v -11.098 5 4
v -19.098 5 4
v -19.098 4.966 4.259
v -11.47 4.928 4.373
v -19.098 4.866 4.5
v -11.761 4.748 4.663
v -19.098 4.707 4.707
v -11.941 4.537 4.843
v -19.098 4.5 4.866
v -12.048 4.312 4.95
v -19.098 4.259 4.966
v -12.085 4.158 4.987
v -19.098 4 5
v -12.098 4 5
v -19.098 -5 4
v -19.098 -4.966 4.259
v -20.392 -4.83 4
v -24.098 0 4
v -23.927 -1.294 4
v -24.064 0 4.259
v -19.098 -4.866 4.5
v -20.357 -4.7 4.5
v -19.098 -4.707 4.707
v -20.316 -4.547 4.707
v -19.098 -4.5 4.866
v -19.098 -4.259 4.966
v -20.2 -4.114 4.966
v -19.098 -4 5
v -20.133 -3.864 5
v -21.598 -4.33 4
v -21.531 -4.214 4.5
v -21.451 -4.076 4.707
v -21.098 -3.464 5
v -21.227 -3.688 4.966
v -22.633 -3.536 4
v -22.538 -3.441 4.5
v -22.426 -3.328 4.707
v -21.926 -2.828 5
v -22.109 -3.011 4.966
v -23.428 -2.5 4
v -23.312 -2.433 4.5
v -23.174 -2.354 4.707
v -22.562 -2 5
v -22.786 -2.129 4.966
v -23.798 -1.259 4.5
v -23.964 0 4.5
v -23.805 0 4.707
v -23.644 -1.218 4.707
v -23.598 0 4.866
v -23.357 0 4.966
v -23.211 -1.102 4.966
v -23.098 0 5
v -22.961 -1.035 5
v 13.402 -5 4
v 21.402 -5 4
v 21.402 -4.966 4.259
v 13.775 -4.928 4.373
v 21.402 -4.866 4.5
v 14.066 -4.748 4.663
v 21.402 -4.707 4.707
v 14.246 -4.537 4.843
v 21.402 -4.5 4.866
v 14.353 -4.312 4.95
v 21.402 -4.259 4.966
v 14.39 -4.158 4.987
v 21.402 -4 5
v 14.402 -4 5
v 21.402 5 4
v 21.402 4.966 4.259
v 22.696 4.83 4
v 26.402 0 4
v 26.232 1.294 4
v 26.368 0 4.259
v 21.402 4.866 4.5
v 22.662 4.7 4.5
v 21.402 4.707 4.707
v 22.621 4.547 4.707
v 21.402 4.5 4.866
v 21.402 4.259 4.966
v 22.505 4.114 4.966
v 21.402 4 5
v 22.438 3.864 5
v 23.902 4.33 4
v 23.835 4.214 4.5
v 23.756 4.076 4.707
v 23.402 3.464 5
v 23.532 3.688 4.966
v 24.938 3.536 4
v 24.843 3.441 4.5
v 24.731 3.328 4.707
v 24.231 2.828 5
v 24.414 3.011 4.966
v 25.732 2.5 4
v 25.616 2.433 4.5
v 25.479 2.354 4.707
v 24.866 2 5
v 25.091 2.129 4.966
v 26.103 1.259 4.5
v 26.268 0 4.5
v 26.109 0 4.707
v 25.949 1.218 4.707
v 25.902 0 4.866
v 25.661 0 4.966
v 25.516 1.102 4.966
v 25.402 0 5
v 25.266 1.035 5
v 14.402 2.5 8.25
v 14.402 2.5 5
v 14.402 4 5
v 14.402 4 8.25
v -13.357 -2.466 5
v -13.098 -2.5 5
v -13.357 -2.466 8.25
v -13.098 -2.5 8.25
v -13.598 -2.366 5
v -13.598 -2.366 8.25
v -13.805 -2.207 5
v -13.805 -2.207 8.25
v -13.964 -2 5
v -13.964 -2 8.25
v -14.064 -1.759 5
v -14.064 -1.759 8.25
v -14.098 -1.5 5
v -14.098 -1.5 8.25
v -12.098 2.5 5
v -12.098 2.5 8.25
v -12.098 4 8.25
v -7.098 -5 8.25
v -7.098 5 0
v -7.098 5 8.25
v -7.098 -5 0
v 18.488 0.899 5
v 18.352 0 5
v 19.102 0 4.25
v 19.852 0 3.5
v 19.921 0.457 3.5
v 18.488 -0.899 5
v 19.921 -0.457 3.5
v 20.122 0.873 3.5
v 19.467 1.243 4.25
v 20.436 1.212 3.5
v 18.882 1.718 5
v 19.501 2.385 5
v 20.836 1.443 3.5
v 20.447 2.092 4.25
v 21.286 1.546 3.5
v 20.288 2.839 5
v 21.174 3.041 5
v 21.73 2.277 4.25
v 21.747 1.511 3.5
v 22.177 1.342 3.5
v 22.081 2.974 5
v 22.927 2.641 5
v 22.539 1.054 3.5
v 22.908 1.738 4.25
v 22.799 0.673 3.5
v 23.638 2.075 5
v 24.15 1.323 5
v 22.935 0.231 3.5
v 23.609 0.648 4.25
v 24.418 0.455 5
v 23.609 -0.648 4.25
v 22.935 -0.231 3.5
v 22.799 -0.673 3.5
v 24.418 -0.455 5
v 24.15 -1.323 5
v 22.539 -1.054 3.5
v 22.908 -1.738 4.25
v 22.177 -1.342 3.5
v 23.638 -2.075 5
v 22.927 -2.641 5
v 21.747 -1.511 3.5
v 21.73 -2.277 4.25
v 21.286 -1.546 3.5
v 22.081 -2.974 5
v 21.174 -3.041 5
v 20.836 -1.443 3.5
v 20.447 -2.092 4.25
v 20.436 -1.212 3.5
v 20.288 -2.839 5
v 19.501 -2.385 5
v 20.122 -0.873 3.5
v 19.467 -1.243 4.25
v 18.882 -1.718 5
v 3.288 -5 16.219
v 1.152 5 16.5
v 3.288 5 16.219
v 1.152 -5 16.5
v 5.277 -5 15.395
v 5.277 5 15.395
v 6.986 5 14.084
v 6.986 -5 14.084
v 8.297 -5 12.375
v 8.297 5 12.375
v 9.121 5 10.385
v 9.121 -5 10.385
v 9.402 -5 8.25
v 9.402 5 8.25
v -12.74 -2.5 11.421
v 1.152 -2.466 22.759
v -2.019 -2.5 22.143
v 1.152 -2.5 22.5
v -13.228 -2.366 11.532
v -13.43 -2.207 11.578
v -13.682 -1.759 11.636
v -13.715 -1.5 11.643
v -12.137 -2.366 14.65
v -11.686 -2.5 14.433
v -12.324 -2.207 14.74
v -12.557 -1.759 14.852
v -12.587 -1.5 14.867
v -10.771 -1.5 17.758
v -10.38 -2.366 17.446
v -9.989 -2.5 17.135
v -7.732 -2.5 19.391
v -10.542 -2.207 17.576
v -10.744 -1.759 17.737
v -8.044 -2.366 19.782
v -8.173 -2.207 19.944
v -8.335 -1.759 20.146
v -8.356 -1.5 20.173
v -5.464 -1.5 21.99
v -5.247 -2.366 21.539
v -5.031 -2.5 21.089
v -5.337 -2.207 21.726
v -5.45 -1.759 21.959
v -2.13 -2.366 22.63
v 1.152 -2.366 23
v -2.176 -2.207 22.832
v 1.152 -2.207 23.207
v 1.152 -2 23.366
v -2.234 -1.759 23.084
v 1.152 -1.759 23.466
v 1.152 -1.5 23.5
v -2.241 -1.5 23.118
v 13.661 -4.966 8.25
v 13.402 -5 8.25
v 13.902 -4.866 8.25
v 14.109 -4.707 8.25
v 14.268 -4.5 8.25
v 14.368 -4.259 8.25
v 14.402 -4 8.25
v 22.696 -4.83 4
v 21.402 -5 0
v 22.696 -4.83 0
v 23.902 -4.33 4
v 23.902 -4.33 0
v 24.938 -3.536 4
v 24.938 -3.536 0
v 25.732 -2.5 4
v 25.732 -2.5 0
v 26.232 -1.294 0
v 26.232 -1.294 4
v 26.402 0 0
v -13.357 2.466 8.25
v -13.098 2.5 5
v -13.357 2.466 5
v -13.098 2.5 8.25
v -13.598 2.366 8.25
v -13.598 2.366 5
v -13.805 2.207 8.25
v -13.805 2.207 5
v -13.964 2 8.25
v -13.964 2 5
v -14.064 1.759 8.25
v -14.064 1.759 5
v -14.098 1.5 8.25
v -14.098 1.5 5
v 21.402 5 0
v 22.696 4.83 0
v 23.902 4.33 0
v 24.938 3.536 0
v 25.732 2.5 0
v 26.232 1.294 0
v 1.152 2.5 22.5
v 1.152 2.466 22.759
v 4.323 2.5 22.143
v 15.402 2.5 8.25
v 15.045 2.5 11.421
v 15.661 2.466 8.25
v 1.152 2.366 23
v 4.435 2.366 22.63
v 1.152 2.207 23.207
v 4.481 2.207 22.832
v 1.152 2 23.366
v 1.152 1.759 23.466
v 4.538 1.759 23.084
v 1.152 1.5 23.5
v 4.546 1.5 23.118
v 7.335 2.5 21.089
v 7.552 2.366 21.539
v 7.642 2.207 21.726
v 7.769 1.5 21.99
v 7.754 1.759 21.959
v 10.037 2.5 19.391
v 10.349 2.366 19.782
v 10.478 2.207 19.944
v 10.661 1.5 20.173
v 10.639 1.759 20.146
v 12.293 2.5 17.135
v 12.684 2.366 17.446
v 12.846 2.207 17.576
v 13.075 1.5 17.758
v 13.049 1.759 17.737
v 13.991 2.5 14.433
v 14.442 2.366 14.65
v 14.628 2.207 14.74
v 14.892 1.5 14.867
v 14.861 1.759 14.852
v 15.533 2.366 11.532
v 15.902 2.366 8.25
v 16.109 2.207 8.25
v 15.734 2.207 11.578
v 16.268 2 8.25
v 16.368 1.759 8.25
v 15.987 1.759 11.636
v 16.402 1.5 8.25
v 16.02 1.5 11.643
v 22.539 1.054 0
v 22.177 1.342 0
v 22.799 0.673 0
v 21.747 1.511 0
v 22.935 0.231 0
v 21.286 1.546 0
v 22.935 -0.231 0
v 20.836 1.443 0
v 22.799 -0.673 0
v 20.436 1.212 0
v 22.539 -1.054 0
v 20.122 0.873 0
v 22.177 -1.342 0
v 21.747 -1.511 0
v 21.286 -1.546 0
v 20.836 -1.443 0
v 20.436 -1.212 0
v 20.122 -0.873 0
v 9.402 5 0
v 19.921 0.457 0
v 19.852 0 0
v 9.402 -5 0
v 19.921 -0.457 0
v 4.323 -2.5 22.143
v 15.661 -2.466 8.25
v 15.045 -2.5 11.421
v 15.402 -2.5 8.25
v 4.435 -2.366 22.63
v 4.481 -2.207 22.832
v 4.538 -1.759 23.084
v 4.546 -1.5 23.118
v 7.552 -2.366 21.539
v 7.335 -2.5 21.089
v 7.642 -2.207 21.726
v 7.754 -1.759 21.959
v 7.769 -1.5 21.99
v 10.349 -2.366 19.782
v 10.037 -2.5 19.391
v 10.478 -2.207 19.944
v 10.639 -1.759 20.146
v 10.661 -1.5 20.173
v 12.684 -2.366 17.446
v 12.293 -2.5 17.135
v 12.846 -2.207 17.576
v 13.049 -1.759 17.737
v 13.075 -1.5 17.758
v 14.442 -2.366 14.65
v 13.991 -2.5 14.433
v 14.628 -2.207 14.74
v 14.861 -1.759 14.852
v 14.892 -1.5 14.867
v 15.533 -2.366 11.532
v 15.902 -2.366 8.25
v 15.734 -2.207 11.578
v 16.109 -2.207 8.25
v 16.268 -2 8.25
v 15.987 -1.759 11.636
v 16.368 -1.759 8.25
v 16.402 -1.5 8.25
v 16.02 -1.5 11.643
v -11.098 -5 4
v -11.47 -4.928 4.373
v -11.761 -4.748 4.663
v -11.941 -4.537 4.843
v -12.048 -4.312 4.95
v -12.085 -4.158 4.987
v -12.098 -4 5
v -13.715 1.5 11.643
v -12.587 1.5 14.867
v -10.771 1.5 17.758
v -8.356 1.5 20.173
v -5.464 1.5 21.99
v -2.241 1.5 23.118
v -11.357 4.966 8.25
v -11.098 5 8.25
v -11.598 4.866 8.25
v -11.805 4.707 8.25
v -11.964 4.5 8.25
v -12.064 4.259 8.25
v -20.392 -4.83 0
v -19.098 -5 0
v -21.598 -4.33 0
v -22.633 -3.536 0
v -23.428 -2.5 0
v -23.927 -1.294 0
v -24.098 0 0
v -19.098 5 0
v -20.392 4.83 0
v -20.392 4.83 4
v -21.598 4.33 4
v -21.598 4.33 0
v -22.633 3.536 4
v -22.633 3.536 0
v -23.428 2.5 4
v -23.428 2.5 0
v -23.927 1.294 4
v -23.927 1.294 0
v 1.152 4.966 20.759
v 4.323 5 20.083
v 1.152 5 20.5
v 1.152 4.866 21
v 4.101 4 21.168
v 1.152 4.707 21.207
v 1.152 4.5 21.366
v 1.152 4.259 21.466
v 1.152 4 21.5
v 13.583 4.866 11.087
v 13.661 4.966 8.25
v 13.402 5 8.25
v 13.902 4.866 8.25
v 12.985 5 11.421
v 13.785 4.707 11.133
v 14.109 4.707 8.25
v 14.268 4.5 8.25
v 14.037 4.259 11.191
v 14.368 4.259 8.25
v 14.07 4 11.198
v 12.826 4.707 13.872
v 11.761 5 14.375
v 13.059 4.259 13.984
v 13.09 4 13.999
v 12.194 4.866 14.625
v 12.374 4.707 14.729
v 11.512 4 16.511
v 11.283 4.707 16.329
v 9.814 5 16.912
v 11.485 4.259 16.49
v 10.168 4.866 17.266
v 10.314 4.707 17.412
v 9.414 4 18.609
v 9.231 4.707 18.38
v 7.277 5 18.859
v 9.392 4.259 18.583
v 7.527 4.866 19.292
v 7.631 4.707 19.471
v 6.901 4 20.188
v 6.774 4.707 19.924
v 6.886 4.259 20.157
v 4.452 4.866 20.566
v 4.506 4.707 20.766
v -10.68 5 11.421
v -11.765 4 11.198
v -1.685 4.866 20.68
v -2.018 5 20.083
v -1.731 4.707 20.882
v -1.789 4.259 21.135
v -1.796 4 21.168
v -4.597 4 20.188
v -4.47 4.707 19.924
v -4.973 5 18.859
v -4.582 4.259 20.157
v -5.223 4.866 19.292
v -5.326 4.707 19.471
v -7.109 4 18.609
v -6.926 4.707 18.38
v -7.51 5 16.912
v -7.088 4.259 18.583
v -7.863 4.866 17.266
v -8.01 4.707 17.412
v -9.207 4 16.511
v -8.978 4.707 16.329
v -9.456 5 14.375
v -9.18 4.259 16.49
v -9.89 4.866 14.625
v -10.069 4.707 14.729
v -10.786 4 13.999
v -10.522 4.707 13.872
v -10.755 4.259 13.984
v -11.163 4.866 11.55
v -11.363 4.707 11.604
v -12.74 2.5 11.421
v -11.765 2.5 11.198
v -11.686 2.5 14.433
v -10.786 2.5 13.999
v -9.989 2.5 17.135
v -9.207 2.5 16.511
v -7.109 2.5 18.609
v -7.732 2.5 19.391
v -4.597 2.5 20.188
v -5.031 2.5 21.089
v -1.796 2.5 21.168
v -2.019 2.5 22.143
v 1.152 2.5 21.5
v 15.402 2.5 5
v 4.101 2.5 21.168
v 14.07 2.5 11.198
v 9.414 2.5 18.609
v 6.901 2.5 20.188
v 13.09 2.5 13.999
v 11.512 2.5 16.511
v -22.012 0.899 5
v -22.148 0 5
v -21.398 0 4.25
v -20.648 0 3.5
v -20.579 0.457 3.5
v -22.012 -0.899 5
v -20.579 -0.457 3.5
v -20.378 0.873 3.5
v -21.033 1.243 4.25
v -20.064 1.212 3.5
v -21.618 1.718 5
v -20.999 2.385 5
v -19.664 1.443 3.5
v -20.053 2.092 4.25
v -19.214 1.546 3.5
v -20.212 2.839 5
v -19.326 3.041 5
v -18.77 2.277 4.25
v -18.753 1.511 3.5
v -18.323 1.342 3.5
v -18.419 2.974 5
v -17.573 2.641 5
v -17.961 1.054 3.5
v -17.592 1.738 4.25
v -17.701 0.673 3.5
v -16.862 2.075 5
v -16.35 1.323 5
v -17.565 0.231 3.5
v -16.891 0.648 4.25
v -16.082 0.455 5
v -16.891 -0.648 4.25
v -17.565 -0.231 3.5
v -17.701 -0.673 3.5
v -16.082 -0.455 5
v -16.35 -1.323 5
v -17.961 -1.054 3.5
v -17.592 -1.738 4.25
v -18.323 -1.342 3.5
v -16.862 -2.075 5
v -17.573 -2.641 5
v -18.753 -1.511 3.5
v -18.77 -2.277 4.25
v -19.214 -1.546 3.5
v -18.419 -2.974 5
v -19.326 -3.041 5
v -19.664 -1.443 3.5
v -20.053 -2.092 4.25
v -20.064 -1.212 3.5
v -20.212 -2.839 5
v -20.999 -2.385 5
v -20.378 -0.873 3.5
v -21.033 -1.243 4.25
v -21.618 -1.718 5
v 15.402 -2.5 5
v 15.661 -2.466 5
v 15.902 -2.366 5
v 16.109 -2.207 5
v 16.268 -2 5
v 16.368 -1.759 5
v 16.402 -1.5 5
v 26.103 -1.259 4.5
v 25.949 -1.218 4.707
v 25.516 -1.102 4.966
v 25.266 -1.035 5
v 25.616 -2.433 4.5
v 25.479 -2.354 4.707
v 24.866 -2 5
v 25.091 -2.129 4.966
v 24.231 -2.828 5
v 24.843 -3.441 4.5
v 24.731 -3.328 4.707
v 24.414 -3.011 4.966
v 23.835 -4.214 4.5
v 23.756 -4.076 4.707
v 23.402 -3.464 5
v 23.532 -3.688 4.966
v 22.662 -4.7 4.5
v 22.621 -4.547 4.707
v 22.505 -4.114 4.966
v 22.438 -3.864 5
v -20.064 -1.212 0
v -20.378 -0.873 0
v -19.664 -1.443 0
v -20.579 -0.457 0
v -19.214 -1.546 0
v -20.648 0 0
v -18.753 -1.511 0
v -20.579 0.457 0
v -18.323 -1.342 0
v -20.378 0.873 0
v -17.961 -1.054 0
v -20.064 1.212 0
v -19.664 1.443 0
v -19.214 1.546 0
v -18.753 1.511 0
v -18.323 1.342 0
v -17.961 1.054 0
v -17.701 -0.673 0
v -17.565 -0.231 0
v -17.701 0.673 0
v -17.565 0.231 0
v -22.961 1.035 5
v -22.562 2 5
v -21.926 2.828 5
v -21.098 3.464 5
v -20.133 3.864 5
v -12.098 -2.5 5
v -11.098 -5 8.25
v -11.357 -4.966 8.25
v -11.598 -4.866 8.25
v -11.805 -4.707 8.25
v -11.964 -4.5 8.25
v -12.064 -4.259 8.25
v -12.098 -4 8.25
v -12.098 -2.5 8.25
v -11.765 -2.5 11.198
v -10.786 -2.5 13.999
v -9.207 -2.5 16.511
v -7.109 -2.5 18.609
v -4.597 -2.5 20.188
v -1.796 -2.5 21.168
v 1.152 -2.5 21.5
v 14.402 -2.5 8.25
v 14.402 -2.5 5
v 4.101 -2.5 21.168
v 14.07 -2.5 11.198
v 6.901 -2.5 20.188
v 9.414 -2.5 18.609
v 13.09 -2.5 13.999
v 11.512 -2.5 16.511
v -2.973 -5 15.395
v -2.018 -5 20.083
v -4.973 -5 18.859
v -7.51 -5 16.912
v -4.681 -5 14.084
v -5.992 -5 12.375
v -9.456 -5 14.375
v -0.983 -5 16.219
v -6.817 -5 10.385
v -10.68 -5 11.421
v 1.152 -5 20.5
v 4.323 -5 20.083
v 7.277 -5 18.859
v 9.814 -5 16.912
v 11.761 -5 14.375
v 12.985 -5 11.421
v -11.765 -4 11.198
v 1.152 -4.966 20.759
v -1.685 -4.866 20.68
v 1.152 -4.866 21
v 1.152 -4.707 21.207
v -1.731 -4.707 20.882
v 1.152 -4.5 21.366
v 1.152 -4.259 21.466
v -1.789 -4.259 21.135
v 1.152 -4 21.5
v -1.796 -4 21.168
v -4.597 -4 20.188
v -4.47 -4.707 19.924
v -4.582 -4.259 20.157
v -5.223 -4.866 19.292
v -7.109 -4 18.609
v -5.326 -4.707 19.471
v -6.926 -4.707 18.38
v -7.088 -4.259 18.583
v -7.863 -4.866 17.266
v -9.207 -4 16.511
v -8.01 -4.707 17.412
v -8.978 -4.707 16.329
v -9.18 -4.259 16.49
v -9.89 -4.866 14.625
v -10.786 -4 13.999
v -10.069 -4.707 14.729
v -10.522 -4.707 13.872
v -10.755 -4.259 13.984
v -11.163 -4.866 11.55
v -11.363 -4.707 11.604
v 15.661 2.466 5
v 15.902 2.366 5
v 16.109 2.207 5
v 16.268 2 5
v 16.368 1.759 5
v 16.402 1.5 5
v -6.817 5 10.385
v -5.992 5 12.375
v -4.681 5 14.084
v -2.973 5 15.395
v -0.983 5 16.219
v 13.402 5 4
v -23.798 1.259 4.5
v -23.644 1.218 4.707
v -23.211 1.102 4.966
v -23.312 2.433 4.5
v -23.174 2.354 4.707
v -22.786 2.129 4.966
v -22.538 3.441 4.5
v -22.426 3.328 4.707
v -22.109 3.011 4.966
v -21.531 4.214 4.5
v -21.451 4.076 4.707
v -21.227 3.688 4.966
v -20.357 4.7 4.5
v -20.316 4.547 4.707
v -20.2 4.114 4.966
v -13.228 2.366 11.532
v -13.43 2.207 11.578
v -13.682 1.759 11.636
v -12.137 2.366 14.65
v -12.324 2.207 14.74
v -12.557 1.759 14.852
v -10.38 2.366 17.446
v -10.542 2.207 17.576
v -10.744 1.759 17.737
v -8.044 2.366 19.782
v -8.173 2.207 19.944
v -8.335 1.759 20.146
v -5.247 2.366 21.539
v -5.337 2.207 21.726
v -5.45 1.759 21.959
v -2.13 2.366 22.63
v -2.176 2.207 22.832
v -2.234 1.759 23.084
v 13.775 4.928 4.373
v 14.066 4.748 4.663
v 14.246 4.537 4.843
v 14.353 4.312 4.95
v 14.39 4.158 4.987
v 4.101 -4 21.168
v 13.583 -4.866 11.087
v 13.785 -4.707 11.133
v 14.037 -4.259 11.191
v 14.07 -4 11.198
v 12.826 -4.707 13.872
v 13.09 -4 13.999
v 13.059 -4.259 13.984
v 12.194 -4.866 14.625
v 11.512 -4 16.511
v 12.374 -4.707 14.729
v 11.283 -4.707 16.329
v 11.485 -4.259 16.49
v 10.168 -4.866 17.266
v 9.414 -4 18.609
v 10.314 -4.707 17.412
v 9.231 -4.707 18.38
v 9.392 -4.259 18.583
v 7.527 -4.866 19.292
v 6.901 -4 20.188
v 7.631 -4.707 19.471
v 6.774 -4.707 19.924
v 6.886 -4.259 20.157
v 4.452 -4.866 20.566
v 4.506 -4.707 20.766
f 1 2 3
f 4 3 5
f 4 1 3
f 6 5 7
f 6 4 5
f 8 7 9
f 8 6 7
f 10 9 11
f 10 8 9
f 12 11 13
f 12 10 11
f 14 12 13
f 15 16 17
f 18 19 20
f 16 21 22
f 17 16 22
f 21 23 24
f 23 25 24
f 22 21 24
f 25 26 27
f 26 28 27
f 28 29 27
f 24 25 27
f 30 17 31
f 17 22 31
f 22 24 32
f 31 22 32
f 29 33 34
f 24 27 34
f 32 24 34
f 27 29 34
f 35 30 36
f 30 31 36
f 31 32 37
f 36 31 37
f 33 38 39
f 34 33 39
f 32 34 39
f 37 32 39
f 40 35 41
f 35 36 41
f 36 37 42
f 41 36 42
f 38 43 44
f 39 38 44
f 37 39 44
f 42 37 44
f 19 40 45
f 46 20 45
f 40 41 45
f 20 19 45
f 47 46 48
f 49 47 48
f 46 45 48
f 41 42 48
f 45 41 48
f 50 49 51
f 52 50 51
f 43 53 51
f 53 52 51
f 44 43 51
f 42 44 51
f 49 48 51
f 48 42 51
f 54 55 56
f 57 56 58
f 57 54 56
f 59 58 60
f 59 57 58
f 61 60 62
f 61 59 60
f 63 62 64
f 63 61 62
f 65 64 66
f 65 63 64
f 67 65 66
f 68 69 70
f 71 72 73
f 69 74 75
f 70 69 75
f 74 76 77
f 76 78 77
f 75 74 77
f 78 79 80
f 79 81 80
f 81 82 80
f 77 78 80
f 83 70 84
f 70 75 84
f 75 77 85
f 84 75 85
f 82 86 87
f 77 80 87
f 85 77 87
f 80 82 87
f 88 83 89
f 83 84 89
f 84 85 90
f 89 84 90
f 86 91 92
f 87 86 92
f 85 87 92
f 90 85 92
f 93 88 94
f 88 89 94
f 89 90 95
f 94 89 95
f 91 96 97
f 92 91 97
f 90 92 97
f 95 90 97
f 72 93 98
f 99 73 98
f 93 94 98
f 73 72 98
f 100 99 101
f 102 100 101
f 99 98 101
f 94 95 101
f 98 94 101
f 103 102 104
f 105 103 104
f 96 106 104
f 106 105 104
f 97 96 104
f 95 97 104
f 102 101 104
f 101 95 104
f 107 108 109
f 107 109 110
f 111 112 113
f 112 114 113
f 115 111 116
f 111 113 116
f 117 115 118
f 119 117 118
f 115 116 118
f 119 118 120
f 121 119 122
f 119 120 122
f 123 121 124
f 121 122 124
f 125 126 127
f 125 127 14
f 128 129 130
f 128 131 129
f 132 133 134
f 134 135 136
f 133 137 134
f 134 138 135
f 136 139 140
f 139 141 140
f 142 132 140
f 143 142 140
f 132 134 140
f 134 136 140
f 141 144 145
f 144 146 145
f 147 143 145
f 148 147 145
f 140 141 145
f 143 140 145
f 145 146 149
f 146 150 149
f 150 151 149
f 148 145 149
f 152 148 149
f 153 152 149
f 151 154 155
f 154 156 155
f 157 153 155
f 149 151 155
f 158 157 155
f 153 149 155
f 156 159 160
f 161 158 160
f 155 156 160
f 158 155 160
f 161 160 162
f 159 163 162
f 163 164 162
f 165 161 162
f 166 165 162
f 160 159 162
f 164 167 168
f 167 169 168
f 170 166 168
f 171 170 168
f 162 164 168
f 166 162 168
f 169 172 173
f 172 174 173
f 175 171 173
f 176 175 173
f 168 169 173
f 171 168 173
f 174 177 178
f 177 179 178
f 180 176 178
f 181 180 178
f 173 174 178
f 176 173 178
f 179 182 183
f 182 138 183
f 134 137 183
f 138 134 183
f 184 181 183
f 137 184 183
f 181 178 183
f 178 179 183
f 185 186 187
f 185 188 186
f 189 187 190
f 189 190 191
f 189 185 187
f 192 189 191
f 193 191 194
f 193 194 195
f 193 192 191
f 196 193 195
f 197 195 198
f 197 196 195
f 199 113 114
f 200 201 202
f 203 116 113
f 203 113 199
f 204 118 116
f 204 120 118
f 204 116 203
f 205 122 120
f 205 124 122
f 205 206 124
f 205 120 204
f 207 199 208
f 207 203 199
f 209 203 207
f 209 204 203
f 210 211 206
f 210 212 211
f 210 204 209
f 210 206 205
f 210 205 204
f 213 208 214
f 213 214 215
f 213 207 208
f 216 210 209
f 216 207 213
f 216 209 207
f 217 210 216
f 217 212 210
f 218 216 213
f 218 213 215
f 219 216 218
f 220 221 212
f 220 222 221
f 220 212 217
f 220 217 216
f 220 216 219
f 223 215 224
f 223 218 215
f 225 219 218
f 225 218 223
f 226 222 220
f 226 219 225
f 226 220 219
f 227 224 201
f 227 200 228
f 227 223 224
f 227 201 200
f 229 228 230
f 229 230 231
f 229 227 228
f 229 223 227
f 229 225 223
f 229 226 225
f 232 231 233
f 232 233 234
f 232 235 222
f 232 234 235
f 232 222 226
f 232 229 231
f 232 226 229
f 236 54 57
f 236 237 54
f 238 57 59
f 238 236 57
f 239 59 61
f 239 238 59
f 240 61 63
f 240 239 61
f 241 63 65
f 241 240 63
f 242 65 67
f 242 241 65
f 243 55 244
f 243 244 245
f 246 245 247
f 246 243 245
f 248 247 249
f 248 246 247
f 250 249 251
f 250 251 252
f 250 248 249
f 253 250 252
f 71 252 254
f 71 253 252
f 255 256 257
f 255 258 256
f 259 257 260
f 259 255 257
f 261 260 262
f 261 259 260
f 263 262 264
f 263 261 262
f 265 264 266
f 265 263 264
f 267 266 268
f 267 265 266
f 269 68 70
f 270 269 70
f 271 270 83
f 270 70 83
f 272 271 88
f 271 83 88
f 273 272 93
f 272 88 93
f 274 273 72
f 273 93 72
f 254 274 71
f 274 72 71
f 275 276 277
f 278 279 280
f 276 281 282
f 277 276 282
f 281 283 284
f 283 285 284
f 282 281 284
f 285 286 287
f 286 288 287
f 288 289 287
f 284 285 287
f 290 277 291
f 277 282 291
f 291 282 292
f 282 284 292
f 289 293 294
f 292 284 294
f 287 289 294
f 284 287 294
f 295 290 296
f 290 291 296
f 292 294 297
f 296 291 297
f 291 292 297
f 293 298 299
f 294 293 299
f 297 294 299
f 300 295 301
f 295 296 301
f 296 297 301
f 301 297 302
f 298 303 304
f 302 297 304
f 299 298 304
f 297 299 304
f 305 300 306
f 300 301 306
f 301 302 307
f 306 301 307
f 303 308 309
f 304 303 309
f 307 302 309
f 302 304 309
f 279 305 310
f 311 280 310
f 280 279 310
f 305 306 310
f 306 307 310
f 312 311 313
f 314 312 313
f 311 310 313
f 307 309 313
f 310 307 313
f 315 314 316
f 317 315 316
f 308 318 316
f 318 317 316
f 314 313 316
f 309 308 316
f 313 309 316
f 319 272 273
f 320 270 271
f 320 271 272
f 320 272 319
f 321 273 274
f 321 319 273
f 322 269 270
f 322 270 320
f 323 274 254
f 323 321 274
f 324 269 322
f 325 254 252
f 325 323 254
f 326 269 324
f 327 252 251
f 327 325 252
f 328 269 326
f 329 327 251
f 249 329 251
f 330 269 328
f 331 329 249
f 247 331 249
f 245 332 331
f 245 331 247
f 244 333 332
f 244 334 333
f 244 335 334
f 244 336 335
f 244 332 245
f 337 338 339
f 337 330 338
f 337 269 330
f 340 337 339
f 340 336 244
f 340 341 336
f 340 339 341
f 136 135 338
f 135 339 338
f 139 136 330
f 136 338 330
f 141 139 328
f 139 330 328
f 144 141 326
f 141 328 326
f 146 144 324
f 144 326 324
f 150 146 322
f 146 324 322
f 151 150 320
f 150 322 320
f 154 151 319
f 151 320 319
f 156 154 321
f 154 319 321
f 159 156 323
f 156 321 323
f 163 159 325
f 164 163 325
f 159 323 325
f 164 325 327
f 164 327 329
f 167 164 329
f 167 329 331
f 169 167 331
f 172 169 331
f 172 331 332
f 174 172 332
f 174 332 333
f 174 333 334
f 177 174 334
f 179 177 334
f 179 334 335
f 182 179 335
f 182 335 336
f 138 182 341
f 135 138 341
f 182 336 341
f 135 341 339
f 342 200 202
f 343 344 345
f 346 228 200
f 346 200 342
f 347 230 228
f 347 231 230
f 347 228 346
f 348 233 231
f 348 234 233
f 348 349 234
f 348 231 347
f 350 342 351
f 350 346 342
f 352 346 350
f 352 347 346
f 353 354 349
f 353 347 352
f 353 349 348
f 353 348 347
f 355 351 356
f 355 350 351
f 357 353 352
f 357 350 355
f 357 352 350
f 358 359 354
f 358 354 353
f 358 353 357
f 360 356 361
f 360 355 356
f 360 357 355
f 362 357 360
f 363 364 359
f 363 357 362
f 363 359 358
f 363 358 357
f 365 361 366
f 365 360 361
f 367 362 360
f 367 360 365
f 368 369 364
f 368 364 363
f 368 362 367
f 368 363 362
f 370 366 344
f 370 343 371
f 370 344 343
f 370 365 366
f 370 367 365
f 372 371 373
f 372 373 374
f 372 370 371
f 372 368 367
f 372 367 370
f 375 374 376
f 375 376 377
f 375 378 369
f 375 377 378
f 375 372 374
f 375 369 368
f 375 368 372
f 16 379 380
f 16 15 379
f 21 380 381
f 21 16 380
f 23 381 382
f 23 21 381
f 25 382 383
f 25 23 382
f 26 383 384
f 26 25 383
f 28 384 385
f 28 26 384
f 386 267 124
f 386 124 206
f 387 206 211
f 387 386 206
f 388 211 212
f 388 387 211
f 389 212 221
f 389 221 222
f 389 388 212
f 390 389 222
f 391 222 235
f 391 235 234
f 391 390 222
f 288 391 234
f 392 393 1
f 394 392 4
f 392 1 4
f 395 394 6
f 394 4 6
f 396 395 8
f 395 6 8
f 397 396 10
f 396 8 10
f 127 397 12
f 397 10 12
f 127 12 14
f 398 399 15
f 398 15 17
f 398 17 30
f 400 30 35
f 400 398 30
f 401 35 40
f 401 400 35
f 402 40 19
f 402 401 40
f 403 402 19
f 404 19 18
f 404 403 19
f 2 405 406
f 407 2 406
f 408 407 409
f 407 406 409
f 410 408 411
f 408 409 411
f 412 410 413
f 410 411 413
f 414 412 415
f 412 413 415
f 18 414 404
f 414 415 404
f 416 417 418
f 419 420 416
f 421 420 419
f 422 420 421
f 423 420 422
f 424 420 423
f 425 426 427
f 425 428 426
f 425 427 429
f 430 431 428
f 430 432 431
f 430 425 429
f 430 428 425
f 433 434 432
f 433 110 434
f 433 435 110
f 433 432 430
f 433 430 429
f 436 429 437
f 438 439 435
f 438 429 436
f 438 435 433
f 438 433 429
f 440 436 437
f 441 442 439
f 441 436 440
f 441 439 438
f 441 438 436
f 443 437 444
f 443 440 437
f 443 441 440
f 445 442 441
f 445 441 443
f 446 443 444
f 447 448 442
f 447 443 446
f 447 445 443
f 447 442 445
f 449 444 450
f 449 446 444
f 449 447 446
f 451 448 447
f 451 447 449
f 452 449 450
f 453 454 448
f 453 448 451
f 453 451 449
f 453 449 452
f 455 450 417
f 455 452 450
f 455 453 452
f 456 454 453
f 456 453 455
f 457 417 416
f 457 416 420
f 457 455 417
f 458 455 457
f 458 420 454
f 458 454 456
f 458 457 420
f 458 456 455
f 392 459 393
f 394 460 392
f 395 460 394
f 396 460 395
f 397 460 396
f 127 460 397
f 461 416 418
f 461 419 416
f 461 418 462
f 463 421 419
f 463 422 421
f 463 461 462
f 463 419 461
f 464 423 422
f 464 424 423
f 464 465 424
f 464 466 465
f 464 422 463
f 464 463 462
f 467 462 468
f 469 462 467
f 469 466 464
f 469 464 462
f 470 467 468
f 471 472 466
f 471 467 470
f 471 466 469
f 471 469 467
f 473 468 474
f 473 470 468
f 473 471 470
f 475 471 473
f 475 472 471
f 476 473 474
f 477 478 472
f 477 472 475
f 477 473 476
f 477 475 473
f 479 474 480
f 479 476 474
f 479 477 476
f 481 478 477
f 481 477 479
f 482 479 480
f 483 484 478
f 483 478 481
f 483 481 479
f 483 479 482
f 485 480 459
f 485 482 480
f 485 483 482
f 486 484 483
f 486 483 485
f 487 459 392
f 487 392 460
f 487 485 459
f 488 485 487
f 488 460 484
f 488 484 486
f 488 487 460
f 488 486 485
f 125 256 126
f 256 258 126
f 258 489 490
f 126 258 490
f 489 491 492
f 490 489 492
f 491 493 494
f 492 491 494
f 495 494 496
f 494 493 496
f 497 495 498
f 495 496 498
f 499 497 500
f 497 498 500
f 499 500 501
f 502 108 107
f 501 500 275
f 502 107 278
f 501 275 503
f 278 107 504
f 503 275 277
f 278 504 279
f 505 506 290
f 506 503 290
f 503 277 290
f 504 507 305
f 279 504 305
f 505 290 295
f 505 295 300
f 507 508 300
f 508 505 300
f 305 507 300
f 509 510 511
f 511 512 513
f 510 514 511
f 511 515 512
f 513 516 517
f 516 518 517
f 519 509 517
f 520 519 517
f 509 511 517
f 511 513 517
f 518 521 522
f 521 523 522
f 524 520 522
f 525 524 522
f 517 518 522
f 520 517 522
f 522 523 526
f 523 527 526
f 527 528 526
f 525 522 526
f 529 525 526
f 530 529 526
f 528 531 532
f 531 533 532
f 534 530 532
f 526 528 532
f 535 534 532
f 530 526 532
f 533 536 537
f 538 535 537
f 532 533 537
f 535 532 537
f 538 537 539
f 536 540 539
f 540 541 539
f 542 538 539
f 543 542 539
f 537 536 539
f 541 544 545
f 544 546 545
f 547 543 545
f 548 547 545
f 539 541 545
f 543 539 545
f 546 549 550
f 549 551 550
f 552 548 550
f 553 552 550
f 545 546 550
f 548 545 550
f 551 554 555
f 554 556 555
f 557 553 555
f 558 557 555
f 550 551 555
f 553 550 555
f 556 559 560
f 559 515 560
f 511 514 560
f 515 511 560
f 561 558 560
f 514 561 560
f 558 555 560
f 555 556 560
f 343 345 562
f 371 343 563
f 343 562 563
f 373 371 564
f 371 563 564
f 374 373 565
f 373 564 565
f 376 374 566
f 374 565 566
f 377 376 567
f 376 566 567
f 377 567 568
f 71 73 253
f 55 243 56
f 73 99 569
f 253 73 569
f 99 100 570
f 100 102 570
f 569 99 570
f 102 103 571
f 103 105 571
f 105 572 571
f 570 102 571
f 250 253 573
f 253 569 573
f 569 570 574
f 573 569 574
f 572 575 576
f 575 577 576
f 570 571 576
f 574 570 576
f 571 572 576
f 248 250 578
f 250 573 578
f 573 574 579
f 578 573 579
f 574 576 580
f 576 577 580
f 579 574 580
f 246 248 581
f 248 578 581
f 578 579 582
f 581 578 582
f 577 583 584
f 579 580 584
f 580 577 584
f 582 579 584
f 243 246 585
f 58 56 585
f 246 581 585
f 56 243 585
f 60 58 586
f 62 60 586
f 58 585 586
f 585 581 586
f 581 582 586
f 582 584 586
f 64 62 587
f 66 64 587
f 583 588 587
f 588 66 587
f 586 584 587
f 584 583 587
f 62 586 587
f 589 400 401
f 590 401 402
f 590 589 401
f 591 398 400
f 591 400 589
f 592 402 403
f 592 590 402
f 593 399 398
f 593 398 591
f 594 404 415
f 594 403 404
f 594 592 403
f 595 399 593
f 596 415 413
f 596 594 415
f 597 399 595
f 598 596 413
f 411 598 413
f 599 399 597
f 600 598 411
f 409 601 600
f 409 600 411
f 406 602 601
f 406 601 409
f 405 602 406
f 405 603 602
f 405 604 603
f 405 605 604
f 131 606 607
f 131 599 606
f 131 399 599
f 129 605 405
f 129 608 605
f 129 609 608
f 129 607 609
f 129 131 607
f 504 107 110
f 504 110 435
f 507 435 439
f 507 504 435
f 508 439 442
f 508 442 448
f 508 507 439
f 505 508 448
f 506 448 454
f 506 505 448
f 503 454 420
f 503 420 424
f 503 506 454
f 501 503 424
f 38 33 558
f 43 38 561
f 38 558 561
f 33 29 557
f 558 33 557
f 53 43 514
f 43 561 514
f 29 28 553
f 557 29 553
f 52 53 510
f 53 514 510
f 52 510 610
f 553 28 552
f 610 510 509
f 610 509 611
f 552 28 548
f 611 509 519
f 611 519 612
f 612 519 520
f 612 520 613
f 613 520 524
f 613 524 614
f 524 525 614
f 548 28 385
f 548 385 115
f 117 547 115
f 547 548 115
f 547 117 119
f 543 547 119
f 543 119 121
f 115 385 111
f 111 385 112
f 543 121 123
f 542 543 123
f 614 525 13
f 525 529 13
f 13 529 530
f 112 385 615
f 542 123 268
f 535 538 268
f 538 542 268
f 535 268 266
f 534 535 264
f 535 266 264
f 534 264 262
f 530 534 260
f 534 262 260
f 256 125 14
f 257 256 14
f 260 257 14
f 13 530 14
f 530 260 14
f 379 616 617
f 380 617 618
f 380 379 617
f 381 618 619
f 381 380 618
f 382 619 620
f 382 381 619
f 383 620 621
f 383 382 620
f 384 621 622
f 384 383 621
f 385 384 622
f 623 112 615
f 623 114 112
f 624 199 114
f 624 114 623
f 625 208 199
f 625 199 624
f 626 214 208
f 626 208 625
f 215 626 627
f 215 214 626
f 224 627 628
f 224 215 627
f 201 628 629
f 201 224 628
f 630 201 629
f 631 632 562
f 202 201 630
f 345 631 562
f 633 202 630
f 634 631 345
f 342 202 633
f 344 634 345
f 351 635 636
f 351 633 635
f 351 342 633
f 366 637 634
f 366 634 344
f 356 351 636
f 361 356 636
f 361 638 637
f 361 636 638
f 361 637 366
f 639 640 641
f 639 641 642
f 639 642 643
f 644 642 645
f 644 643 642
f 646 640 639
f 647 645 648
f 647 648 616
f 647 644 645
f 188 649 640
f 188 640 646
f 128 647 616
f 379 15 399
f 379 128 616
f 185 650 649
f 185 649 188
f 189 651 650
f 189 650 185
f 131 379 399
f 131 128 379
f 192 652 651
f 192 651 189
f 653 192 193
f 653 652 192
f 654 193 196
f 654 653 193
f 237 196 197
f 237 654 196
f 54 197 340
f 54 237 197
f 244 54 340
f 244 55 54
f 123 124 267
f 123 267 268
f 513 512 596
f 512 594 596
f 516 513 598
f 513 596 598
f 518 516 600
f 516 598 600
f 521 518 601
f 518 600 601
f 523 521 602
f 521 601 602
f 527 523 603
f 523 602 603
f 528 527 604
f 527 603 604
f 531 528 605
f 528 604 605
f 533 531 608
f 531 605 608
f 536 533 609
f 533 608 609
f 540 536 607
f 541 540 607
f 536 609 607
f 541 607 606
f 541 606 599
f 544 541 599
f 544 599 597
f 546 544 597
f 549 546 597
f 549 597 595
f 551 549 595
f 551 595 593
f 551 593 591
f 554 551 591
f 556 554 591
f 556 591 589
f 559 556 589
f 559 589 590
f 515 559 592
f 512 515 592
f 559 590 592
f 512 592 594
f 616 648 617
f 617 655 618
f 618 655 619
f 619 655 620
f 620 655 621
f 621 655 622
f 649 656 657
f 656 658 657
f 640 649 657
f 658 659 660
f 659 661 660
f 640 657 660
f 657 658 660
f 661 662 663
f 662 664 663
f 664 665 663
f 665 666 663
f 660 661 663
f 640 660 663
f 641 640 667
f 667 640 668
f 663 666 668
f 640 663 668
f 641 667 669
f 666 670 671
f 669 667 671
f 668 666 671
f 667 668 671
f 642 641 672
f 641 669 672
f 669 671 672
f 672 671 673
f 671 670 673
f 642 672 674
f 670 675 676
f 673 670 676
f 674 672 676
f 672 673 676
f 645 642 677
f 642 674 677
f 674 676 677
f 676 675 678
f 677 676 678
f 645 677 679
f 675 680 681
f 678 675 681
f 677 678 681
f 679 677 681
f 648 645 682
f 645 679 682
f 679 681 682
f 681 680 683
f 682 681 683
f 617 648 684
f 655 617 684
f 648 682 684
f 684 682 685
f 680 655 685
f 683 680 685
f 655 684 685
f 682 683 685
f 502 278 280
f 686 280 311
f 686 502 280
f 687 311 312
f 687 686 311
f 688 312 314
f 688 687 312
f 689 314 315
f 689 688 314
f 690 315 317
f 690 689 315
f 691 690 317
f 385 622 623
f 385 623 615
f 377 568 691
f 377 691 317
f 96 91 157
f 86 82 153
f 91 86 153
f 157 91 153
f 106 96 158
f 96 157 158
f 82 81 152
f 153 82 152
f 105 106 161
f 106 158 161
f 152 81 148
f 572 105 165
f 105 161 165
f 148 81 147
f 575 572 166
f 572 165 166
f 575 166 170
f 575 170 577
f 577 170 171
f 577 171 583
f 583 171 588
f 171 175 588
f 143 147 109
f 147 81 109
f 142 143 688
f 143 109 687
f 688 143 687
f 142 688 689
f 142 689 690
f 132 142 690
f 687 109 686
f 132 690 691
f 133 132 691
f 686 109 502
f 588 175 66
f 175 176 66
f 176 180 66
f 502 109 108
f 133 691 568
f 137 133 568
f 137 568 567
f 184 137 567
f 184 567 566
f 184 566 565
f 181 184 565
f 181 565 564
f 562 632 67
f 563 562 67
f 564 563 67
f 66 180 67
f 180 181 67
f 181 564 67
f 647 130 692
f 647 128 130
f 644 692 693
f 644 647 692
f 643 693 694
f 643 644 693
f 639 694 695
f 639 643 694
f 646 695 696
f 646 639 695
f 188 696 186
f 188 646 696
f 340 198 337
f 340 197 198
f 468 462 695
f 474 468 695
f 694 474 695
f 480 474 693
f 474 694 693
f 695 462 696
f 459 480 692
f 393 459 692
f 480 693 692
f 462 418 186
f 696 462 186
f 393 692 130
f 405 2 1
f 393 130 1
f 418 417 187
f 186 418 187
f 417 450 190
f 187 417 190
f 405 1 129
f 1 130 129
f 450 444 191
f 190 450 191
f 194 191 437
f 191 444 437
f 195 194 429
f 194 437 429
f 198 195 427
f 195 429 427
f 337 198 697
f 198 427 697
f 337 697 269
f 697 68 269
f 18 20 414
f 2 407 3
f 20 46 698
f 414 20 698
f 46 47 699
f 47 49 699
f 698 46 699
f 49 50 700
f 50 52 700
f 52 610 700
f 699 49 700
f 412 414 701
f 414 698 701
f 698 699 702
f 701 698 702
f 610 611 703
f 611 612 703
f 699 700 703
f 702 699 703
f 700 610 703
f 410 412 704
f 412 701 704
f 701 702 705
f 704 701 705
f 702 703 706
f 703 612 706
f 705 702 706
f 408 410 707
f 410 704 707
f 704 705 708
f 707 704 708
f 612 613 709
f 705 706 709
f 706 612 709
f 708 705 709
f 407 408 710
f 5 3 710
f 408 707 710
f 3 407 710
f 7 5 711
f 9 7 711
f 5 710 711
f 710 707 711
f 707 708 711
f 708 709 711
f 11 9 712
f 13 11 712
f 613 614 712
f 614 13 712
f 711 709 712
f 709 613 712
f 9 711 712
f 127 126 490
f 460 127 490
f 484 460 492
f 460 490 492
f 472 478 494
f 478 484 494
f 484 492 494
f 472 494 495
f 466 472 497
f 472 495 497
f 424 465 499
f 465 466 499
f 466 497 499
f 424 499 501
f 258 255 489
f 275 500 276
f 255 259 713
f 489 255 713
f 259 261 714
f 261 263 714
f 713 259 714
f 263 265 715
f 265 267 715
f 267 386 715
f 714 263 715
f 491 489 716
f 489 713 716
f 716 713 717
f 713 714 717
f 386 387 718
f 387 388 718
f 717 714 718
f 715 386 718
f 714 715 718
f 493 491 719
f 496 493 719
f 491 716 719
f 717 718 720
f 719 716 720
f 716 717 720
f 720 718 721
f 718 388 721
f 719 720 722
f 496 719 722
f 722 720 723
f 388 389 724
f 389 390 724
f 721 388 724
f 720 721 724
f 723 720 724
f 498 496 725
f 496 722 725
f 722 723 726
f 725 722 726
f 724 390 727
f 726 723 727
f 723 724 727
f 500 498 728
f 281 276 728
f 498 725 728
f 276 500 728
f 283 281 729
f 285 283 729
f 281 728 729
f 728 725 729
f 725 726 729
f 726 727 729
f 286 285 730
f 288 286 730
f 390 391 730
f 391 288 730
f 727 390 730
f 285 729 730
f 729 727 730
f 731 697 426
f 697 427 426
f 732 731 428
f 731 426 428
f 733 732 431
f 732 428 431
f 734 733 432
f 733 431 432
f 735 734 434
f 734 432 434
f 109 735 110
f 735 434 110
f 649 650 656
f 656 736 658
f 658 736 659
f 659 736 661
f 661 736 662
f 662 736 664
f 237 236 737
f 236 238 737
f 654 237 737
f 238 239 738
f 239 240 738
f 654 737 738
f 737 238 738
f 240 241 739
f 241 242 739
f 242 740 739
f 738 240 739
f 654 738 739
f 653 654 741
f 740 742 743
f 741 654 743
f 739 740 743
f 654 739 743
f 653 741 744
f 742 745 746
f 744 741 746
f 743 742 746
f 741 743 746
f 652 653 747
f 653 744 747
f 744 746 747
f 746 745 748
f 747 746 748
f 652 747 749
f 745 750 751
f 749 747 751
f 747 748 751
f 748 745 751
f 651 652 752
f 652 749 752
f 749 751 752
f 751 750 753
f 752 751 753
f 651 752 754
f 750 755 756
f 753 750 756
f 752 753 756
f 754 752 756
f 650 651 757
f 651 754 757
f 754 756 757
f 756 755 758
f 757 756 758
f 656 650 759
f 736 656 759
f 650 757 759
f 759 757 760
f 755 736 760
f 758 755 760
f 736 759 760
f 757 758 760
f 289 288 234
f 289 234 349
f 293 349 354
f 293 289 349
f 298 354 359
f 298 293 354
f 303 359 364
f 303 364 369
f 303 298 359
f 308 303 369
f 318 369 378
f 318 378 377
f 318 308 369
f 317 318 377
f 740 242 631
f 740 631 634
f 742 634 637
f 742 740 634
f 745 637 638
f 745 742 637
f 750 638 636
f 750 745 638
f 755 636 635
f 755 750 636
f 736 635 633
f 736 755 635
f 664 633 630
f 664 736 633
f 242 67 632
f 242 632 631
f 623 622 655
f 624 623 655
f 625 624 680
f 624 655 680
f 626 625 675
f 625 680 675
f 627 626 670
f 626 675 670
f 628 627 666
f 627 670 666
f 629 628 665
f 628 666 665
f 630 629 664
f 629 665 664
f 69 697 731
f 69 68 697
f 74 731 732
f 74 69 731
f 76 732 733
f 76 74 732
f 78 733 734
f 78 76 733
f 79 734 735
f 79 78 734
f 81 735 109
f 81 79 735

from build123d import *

# Parameters (mm, degrees)
F1_DEPTH        = 5
F2_DEPTH        = 2.5
F3_R            = 8.24999
F4_R            = 13.24999
F5_R            = 13.24999
F6_R            = 15.24999
F7_DEPTH        = 4
F8_DEPTH        = 4
F9_R            = 4.99999
F11_D           = 3.1
F11_CSINK_D     = 6.1
F11_CSINK_ANGLE = 90
F13_D           = 3.1
F13_CSINK_D     = 6.1
F13_CSINK_ANGLE = 90
F14_R           = 1


# Not quite as in the source:
# - a fillet or chamfer is up to 0.001 mm smaller than in the source, because OpenCascade refuses the exact size


with BuildPart() as f1:
    # F0 (on Front) → F1 (new body, symmetric)
    with BuildSketch(Plane.XZ):
        Polygon((-20.0976822525, 0), (-7.0976822525, 0), (-7.0976822525, 8.25), (-7.0976822525, 16.5), (9.4023177475, 16.5), (9.4023177475, 0), (22.4023177475, 0), (22.4023177475, 5), (16.4023177475, 5), (14.4023177475, 5), (14.4023177475, 21.5), (-12.0976822525, 21.5), (-12.0976822525, 5), (-14.0976822525, 5), (-20.0976822525, 5), align=None)
    extrude(amount=F1_DEPTH, both=True)

    # F0 (on Front) → F2 (join, symmetric)
    with BuildSketch(Plane.XZ):
        Polygon((-14.0976822525, 23.5), (-14.0976822525, 5), (-12.0976822525, 5), (-12.0976822525, 21.5), (14.4023177475, 21.5), (14.4023177475, 5), (16.4023177475, 5), (16.4023177475, 23.5), align=None)
    extrude(amount=F2_DEPTH, both=True)

    # F3 (radius 8.25 in the source; OpenCascade refuses exactly that, so slightly less here)
    f3_edges = [f1.edges().sort_by_distance(p)[0] for p in [
        (-7.097682, 0, 16.5),
        (9.402318, 0, 16.5),
    ]]
    fillet(f3_edges, radius=F3_R)

    # F4 (radius 13.25 in the source; OpenCascade refuses exactly that, so slightly less here)
    f4_edges = [f1.edges().sort_by_distance(p)[0] for p in [
        (14.402318, -3.75, 21.5),
        (-12.097682, -3.75, 21.5),
    ]]
    fillet(f4_edges, radius=F4_R)

    # F5 (radius 13.25 in the source; OpenCascade refuses exactly that, so slightly less here)
    f5_edges = [f1.edges().sort_by_distance(p)[0] for p in [
        (14.402318, 3.75, 21.5),
        (-12.097682, 3.75, 21.5),
    ]]
    fillet(f5_edges, radius=F5_R)

    # F6 (radius 15.25 in the source; OpenCascade refuses exactly that, so slightly less here)
    f6_edges = [f1.edges().sort_by_distance(p)[0] for p in [
        (16.402318, 0, 23.5),
        (-14.097682, 0, 23.5),
    ]]
    fillet(f6_edges, radius=F6_R)

    # F7 (add): a face of the model
    f7_faces = [f1.faces().sort_by_distance(p)[0] for p in [
        (22.4023177475, 0, 2.5),
    ]]
    extrude(f7_faces, amount=F7_DEPTH)

    # F8 (add): a face of the model
    f8_faces = [f1.faces().sort_by_distance(p)[0] for p in [
        (-20.0976822525, 0, 2.5),
    ]]
    extrude(f8_faces, amount=F8_DEPTH)

    # F9 (radius 5 in the source; OpenCascade refuses exactly that, so slightly less here)
    f9_edges = [f1.edges().sort_by_distance(p)[0] for p in [
        (26.402318, -5, 2.5),
        (26.402318, 5, 2.5),
        (-24.097682, -5, 2.5),
        (-24.097682, 5, 2.5),
    ]]
    fillet(f9_edges, radius=F9_R)

    # F11 (through all)
    with Locations(Plane.XY.offset(5)):
        with Locations((-19.0976822525, 0)):
            CounterSinkHole(F11_D / 2, F11_CSINK_D / 2, counter_sink_angle=F11_CSINK_ANGLE)

    # F13 (through all)
    with Locations(Plane.XY.offset(5)):
        with Locations((21.4023177475, 0)):
            CounterSinkHole(F13_D / 2, F13_CSINK_D / 2, counter_sink_angle=F13_CSINK_ANGLE)

    # F14
    f14_edges = [f1.edges().sort_by_distance(p)[0] for p in [
        (-9.631064, -2.5, 19.033381),
        (-9.631064, 2.5, 19.033381),
        (17.902323, 5, 5),
        (-15.597687, 5, 5),
        (-12.097682, 5, 6.625005),
        (-8.21685, 5, 17.619168),
        (1.152318, 5, 21.5),
        (10.521486, 5, 17.619168),
        (14.402318, 5, 6.625005),
        (-22.633219, 3.535537, 5),
        (-24.097682, 0, 5),
        (-22.633219, -3.535537, 5),
        (-15.597687, -5, 5),
        (17.902323, -5, 5),
        (24.937855, -3.535537, 5),
        (26.402318, 0, 5),
        (24.937855, 3.535537, 5),
        (-14.097682, 2.5, 6.625005),
        (1.152318, 2.5, 23.5),
        (11.935699, 2.5, 19.033381),
        (16.402318, 2.5, 6.625005),
        (-14.097682, -2.5, 6.625005),
        (-12.097682, -5, 6.625005),
        (-8.21685, -5, 17.619168),
        (1.152318, -5, 21.5),
        (10.521486, -5, 17.619168),
        (14.402318, -5, 6.625005),
        (1.152318, -2.5, 23.5),
        (11.935699, -2.5, 19.033381),
        (16.402318, -2.5, 6.625005),
    ]]
    fillet(f14_edges, radius=F14_R)


solid = f1.part
